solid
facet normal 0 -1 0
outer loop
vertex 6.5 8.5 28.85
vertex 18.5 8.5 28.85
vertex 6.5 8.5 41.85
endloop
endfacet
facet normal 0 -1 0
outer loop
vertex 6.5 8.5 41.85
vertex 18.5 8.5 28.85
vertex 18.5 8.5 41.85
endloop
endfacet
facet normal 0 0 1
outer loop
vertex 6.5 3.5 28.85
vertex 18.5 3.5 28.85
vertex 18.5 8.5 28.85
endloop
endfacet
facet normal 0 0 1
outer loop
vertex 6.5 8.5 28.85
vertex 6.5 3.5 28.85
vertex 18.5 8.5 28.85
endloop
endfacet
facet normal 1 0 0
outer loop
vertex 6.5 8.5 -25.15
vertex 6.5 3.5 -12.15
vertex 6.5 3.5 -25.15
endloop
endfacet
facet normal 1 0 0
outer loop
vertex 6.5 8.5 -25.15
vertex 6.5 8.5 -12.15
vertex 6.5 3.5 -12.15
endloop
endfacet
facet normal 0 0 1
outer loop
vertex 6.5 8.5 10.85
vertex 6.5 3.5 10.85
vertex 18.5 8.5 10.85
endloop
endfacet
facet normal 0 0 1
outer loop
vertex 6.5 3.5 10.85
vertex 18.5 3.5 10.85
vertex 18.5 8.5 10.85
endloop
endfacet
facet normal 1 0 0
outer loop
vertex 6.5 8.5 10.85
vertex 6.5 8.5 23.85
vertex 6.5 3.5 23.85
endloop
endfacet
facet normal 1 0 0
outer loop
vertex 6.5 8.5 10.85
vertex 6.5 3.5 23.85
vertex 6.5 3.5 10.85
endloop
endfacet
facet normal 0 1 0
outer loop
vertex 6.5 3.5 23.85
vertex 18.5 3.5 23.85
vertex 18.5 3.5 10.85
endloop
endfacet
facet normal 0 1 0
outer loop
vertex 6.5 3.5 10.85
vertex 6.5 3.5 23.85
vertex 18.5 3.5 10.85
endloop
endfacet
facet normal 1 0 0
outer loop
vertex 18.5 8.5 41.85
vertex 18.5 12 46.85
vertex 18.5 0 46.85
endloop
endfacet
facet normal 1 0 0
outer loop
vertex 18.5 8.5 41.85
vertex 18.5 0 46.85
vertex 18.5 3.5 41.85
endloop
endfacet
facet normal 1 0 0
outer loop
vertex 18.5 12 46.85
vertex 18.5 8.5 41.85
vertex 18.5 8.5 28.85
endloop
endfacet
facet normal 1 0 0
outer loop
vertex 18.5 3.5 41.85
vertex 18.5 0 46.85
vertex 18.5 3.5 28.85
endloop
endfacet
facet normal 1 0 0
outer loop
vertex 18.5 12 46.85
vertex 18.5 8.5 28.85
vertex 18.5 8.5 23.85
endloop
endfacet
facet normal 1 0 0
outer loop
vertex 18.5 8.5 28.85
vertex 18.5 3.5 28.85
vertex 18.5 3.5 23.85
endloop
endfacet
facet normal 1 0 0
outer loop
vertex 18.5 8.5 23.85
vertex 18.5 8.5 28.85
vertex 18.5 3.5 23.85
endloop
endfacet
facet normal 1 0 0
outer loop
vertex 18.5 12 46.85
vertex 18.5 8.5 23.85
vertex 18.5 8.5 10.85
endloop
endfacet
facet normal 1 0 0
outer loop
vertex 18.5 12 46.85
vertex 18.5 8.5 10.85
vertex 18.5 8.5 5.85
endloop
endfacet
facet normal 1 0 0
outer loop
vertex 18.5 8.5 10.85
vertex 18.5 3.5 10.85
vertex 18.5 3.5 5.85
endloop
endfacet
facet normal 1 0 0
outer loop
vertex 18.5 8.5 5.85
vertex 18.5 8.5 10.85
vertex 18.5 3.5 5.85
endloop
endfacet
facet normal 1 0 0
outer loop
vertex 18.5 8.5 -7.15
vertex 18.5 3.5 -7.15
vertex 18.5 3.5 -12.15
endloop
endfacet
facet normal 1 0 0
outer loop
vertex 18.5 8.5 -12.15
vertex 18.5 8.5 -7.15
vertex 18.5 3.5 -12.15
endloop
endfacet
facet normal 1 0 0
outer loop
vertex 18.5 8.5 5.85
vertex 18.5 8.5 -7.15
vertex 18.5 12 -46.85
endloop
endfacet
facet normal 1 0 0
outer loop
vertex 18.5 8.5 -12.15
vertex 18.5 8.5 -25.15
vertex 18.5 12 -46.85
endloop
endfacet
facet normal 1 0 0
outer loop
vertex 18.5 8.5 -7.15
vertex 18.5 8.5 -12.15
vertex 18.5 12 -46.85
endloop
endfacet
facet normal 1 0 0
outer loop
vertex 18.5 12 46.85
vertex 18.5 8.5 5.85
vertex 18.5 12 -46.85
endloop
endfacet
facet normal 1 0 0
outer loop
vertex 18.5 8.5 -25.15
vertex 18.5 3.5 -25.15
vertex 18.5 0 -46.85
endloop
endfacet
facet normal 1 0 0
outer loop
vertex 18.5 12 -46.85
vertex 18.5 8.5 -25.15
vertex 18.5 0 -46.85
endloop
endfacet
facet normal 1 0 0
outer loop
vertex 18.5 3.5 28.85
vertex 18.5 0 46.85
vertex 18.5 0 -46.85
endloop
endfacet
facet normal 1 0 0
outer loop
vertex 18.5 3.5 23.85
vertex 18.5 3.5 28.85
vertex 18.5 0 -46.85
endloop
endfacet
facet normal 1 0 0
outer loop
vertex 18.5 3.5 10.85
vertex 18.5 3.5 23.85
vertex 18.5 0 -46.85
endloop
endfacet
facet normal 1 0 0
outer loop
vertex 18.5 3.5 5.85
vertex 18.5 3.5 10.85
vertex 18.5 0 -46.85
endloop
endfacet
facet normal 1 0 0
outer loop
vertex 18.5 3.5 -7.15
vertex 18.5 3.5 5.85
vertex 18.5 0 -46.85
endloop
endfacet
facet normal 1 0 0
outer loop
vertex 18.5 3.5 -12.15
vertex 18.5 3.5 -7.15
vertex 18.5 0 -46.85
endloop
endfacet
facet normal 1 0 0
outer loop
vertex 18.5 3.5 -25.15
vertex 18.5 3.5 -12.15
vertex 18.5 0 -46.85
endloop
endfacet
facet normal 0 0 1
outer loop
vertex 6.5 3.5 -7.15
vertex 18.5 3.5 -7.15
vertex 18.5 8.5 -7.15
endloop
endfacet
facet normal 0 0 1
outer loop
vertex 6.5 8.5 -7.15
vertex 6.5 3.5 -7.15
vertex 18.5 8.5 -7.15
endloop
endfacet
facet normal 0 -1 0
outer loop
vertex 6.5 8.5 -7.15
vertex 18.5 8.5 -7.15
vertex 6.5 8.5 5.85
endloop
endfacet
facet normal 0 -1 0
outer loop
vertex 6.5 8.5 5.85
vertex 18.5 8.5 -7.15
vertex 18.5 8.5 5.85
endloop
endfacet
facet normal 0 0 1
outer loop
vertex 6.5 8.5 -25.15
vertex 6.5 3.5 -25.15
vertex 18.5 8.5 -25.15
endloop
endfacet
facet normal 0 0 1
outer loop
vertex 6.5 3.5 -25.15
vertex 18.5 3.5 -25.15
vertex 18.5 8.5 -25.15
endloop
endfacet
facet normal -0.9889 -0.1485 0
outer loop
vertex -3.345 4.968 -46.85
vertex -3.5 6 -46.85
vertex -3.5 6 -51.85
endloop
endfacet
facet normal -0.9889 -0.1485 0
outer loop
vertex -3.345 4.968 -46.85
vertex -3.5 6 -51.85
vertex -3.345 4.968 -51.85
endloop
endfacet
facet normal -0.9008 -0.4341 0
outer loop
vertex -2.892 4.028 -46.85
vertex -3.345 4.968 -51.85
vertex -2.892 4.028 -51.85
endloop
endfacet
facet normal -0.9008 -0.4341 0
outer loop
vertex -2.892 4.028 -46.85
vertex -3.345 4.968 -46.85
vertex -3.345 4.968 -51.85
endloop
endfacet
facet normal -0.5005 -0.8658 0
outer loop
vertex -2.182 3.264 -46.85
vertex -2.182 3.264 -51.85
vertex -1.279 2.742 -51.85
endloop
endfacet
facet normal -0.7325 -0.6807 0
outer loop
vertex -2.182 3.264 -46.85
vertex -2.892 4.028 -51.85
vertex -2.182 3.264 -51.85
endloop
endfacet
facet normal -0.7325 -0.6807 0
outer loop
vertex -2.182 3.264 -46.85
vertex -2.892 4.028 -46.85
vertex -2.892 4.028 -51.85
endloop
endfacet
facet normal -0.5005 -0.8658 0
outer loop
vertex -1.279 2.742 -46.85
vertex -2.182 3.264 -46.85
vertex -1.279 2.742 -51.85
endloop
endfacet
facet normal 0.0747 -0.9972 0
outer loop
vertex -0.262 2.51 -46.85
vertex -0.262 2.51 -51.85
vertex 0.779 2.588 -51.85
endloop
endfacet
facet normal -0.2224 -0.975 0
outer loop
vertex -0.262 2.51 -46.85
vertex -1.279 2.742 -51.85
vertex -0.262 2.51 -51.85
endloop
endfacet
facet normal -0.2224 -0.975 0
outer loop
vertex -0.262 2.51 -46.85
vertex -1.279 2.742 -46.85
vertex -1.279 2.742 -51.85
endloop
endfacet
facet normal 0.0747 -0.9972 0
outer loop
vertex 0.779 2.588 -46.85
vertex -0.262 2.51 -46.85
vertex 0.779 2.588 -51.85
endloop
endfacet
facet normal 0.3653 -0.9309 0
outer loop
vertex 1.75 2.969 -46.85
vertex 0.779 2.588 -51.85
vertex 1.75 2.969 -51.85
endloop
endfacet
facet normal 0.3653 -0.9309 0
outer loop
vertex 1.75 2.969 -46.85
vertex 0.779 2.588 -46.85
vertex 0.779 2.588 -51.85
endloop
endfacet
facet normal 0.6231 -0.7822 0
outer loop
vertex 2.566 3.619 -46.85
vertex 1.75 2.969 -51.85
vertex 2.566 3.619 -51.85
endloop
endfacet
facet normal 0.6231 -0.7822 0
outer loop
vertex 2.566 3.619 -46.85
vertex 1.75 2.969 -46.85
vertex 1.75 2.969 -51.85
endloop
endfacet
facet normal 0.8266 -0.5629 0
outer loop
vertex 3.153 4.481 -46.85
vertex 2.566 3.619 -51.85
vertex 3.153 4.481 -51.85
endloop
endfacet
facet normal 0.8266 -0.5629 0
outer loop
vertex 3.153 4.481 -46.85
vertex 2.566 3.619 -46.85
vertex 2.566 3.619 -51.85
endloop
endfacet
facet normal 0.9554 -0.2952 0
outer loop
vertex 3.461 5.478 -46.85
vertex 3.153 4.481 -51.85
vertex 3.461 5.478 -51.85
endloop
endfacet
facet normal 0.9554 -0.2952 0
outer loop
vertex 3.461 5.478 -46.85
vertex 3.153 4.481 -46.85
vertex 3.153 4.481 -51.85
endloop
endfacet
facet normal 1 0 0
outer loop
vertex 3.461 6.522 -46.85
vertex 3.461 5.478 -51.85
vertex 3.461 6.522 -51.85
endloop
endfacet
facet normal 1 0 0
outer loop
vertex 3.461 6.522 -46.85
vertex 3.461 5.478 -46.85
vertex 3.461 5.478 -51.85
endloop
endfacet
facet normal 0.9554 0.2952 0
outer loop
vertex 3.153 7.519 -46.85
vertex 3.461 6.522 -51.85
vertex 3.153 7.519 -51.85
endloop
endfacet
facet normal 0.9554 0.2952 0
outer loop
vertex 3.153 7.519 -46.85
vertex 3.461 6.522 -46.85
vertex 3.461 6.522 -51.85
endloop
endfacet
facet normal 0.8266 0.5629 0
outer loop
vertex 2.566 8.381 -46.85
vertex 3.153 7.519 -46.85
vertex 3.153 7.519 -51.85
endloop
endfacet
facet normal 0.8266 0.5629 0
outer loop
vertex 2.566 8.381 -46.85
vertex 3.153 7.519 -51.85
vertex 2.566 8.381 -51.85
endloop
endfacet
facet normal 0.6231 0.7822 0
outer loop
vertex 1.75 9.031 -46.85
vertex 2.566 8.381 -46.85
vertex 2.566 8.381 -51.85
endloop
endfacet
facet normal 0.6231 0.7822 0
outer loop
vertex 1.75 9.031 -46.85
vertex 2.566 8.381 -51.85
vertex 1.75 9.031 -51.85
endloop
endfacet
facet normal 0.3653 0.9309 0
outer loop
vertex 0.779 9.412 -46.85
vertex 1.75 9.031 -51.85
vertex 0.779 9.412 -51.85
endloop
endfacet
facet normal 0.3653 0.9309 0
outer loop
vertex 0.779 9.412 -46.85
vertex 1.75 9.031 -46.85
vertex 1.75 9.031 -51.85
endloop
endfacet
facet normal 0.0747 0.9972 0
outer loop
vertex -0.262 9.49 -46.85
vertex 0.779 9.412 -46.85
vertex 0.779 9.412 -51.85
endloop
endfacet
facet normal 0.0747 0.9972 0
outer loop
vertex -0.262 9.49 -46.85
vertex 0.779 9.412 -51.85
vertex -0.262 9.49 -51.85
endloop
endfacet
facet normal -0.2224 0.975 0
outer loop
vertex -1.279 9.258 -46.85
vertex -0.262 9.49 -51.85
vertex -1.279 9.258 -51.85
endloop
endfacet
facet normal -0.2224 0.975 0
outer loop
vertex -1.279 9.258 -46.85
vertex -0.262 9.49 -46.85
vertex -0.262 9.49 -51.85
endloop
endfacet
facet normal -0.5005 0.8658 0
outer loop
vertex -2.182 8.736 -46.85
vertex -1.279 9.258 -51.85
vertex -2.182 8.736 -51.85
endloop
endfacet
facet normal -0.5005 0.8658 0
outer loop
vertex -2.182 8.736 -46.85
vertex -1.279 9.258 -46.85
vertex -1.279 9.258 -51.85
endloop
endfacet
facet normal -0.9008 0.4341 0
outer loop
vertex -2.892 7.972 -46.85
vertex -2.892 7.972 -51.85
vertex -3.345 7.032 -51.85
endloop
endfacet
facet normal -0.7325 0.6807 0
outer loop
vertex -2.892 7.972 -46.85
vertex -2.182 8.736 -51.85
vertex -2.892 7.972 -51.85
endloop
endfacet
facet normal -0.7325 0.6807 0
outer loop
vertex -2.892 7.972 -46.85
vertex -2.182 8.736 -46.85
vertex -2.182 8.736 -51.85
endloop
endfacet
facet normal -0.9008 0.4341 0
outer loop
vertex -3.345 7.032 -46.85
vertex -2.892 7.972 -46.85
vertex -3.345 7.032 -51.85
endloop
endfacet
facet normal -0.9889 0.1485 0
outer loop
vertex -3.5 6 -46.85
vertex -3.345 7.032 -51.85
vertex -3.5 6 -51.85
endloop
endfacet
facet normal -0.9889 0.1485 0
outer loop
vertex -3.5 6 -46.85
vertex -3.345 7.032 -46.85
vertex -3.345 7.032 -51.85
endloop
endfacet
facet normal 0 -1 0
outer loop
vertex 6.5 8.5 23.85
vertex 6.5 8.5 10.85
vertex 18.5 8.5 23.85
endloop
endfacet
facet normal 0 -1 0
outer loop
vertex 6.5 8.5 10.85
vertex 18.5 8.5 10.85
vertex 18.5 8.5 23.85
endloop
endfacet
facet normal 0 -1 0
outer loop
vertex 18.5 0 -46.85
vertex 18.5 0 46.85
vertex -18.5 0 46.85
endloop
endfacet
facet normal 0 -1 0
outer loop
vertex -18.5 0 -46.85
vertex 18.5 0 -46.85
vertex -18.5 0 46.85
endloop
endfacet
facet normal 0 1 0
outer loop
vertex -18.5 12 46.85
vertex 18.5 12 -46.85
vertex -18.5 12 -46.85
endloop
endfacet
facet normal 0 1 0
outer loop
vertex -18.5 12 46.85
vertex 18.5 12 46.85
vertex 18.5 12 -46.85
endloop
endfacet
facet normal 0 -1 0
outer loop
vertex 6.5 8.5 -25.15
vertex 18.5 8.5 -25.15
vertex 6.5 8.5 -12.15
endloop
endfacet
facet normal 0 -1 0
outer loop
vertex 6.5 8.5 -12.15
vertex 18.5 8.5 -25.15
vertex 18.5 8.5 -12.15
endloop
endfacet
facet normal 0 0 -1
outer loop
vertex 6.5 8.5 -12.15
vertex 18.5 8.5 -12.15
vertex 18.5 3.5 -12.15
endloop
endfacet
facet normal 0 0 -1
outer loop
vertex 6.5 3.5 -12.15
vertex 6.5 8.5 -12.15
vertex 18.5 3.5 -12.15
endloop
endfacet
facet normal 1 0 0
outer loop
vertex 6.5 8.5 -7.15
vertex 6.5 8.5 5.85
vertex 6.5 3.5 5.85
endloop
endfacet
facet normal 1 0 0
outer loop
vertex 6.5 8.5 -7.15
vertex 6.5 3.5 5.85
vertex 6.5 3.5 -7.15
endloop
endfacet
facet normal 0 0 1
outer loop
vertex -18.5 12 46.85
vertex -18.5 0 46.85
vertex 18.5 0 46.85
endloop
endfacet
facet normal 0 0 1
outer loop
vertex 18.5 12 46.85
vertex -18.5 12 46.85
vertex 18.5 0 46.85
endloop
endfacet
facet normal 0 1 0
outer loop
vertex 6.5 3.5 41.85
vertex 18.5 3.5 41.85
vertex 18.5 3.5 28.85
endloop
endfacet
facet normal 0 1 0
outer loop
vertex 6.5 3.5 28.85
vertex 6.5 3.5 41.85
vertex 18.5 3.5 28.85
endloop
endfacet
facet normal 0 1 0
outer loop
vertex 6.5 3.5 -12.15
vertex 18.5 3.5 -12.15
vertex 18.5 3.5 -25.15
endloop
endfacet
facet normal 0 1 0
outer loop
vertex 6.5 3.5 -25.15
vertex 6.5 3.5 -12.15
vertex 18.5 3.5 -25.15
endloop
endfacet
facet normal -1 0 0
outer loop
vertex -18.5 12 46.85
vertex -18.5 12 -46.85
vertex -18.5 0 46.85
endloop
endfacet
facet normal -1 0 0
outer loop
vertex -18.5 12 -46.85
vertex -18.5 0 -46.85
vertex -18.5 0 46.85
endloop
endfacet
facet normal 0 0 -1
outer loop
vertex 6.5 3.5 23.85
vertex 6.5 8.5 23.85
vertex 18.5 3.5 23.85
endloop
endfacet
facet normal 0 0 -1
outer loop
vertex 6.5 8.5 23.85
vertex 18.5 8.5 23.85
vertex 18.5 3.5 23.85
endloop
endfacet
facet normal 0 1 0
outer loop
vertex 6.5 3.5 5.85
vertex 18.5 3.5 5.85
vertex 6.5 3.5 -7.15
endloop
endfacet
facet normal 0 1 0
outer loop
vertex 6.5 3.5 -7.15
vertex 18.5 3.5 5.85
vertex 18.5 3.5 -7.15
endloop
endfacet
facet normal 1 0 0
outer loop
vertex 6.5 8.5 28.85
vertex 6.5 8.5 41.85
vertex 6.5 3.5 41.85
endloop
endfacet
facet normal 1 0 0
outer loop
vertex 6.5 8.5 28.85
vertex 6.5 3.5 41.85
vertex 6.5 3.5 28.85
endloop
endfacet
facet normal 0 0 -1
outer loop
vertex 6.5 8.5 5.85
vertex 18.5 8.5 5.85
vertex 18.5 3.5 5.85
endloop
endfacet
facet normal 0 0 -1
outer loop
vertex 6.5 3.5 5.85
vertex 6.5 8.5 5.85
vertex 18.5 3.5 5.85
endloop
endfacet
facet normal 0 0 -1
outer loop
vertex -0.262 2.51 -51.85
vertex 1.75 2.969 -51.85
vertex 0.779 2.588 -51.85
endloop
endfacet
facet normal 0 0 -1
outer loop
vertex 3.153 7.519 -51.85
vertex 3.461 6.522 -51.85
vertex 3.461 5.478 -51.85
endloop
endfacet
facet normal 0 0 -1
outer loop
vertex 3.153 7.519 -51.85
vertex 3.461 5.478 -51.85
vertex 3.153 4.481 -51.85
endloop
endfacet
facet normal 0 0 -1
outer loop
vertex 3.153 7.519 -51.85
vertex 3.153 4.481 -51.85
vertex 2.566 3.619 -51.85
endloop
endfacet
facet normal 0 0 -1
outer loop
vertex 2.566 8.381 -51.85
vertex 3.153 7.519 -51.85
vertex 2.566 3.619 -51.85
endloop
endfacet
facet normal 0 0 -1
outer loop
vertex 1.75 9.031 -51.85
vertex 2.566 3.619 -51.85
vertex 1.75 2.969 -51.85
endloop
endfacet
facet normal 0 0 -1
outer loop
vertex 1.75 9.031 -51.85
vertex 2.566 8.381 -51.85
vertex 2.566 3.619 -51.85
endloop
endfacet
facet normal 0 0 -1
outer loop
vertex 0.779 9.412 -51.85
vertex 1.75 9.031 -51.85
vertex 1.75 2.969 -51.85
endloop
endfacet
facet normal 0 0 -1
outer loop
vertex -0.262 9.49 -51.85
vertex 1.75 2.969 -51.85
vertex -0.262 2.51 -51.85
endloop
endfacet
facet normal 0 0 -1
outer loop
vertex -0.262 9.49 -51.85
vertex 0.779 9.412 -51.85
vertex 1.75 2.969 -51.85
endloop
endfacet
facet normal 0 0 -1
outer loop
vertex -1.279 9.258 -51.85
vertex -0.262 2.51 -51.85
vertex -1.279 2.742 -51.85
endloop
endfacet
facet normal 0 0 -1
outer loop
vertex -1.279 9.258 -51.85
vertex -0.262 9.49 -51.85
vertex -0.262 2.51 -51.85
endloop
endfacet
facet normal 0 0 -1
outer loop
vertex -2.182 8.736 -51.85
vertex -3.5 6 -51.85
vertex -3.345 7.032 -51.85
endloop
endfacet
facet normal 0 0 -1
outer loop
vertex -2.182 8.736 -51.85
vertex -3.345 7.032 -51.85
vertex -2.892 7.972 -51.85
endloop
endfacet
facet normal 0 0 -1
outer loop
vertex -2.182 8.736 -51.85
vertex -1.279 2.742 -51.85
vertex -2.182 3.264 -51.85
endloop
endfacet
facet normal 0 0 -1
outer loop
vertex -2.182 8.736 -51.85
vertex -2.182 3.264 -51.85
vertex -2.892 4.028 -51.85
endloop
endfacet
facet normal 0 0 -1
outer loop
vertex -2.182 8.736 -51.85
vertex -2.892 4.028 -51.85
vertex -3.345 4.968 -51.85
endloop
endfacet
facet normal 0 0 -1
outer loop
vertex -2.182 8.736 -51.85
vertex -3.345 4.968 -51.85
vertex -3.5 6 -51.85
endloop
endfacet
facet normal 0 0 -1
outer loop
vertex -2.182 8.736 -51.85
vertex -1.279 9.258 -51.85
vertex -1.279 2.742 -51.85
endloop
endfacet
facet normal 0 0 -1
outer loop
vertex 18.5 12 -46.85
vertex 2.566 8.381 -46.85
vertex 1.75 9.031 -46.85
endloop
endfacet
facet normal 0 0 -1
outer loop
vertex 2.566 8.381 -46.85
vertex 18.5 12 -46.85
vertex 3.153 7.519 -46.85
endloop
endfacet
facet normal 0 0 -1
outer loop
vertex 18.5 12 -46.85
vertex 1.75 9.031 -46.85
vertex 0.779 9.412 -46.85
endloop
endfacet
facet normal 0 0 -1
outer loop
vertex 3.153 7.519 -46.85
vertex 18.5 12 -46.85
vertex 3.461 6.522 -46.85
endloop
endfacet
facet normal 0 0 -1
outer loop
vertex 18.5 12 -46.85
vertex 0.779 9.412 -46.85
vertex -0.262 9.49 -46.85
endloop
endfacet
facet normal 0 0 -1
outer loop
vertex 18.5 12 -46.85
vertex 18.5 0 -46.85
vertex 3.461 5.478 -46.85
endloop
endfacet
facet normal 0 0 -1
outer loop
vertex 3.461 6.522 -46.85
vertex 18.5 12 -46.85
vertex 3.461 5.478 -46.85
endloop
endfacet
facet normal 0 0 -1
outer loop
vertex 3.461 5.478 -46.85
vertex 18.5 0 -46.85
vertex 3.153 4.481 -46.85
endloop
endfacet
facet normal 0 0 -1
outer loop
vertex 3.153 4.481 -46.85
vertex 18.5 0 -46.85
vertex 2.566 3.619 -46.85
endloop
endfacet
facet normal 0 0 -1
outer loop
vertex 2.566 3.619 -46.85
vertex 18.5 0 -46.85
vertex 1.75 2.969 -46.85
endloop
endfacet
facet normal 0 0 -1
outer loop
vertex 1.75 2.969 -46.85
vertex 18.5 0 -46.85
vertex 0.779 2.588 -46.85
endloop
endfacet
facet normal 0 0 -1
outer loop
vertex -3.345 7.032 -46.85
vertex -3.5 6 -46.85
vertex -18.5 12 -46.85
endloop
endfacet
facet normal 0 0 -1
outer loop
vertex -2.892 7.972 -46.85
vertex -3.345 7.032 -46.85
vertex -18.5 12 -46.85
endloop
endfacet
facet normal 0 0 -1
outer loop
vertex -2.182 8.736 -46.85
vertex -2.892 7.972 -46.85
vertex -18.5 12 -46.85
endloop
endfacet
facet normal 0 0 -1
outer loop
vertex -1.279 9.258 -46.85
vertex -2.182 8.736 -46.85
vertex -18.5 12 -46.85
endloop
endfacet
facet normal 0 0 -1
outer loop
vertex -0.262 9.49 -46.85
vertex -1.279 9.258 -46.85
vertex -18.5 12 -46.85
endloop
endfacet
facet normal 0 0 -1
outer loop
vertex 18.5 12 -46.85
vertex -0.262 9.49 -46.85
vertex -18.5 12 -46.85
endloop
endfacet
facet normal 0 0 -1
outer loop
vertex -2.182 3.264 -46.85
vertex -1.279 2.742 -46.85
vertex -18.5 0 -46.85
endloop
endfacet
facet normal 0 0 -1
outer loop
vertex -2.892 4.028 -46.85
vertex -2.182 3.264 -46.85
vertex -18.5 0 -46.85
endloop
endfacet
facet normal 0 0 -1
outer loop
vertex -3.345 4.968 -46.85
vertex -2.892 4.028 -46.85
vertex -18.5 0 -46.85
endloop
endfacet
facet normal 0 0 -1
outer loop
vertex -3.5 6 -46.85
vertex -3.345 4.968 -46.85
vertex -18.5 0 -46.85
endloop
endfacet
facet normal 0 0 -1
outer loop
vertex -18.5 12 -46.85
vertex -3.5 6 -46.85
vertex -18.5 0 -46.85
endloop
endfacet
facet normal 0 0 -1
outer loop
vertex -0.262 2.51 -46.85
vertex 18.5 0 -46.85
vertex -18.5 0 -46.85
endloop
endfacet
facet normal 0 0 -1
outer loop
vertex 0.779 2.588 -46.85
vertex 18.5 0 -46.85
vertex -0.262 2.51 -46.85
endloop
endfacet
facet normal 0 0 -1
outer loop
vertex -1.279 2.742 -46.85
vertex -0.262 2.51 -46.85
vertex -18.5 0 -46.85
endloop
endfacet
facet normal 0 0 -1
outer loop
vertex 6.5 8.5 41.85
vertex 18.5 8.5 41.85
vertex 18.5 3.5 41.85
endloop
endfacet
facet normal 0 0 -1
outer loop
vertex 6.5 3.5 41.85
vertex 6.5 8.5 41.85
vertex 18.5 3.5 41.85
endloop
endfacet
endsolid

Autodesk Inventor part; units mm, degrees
ref_plane "YZ Plane" through (0, 0, 0) normal (1, 0, 0) x (0, 1, 0)
ref_plane "XZ Plane" through (0, 0, 0) normal (0, 1, 0) x (-1, 0, 0)
ref_plane "XY Plane" through (0, 0, 0) normal (0, 0, 1) x (1, 0, 0)
sketch "Sketch1" plane through (0, 0, 0) normal (0, 1, 0) x (-1, 0, 0)
  line L0 (18.5, 46.85) -> (-18.5, 46.85)
  line L1 (-18.5, 46.85) -> (-18.5, -46.85)
  line L2 (-18.5, -46.85) -> (18.5, -46.85)
  line L3 (18.5, -46.85) -> (18.5, 46.85)
  line L4 (18.5, 46.85) -> (-18.5, -46.85) construction
  line L5 (-18.5, 46.85) -> (18.5, -46.85) construction
  point P0 (0, 0)
  dimension "d0" = 93.7
  dimension "d1" = 37
extrude "Extrusion1" add sketch "Sketch1" along normal blind 12
sketch "Sketch2" plane through (18.5, 0, 46.85) normal (1, 0, 0) x (0, 0, -1)
  line L0 (5, 3.5) -> (18, 3.5)
  line L1 (18, 3.5) -> (18, 8.5)
  line L2 (18, 8.5) -> (5, 8.5)
  line L3 (5, 8.5) -> (5, 3.5)
  line L4 (5, 3.5) -> (18, 8.5) construction
  line L5 (18, 3.5) -> (5, 8.5) construction
  line L6 (23, 3.5) -> (36, 3.5)
  line L7 (36, 3.5) -> (36, 8.5)
  line L8 (36, 8.5) -> (23, 8.5)
  line L9 (23, 8.5) -> (23, 3.5)
  line L10 (23, 3.5) -> (36, 8.5) construction
  line L11 (36, 3.5) -> (23, 8.5) construction
  line L12 (41, 3.5) -> (54, 3.5)
  line L13 (54, 3.5) -> (54, 8.5)
  line L14 (54, 8.5) -> (41, 8.5)
  line L15 (41, 8.5) -> (41, 3.5)
  line L16 (41, 3.5) -> (54, 8.5) construction
  line L17 (54, 3.5) -> (41, 8.5) construction
  line L18 (59, 3.5) -> (72, 3.5)
  line L19 (72, 3.5) -> (72, 8.5)
  line L20 (72, 8.5) -> (59, 8.5)
  line L21 (59, 8.5) -> (59, 3.5)
  line L22 (59, 3.5) -> (72, 8.5) construction
  line L23 (72, 3.5) -> (59, 8.5) construction
  line L24 (0, 0) -> (0, 12) projected
  point P0 (46.85, 0)
  point P1 (11.5, 6)
  point P2 (29.5, 6)
  point P3 (47.5, 6)
  point P4 (65.5, 6)
  point P5 (0, 6)
  point P6 (54, 6)
  dimension "d4" = 5
  dimension "d5" = 5
  dimension "d6" = 5
  dimension "d7" = 5
  dimension "d8" = 13
  dimension "d9" = 5
extrude "Extrusion2" cut sketch "Sketch2" against normal blind 12
sketch "Sketch3" plane through (18.5, 0, -46.85) normal (0, 0, -1) x (-1, 0, 0)
  circle A0 centre (18.5, 6) radius 3.5
  point P0 (18.5, 0)
  dimension "d12" = 7
extrude "Extrusion3" add sketch "Sketch3" along normal blind 5
equation "\"d5\" = d4"
equation "\"d6\" = d5"
equation "\"d7\" = d6"
properties part number "USBextender"
